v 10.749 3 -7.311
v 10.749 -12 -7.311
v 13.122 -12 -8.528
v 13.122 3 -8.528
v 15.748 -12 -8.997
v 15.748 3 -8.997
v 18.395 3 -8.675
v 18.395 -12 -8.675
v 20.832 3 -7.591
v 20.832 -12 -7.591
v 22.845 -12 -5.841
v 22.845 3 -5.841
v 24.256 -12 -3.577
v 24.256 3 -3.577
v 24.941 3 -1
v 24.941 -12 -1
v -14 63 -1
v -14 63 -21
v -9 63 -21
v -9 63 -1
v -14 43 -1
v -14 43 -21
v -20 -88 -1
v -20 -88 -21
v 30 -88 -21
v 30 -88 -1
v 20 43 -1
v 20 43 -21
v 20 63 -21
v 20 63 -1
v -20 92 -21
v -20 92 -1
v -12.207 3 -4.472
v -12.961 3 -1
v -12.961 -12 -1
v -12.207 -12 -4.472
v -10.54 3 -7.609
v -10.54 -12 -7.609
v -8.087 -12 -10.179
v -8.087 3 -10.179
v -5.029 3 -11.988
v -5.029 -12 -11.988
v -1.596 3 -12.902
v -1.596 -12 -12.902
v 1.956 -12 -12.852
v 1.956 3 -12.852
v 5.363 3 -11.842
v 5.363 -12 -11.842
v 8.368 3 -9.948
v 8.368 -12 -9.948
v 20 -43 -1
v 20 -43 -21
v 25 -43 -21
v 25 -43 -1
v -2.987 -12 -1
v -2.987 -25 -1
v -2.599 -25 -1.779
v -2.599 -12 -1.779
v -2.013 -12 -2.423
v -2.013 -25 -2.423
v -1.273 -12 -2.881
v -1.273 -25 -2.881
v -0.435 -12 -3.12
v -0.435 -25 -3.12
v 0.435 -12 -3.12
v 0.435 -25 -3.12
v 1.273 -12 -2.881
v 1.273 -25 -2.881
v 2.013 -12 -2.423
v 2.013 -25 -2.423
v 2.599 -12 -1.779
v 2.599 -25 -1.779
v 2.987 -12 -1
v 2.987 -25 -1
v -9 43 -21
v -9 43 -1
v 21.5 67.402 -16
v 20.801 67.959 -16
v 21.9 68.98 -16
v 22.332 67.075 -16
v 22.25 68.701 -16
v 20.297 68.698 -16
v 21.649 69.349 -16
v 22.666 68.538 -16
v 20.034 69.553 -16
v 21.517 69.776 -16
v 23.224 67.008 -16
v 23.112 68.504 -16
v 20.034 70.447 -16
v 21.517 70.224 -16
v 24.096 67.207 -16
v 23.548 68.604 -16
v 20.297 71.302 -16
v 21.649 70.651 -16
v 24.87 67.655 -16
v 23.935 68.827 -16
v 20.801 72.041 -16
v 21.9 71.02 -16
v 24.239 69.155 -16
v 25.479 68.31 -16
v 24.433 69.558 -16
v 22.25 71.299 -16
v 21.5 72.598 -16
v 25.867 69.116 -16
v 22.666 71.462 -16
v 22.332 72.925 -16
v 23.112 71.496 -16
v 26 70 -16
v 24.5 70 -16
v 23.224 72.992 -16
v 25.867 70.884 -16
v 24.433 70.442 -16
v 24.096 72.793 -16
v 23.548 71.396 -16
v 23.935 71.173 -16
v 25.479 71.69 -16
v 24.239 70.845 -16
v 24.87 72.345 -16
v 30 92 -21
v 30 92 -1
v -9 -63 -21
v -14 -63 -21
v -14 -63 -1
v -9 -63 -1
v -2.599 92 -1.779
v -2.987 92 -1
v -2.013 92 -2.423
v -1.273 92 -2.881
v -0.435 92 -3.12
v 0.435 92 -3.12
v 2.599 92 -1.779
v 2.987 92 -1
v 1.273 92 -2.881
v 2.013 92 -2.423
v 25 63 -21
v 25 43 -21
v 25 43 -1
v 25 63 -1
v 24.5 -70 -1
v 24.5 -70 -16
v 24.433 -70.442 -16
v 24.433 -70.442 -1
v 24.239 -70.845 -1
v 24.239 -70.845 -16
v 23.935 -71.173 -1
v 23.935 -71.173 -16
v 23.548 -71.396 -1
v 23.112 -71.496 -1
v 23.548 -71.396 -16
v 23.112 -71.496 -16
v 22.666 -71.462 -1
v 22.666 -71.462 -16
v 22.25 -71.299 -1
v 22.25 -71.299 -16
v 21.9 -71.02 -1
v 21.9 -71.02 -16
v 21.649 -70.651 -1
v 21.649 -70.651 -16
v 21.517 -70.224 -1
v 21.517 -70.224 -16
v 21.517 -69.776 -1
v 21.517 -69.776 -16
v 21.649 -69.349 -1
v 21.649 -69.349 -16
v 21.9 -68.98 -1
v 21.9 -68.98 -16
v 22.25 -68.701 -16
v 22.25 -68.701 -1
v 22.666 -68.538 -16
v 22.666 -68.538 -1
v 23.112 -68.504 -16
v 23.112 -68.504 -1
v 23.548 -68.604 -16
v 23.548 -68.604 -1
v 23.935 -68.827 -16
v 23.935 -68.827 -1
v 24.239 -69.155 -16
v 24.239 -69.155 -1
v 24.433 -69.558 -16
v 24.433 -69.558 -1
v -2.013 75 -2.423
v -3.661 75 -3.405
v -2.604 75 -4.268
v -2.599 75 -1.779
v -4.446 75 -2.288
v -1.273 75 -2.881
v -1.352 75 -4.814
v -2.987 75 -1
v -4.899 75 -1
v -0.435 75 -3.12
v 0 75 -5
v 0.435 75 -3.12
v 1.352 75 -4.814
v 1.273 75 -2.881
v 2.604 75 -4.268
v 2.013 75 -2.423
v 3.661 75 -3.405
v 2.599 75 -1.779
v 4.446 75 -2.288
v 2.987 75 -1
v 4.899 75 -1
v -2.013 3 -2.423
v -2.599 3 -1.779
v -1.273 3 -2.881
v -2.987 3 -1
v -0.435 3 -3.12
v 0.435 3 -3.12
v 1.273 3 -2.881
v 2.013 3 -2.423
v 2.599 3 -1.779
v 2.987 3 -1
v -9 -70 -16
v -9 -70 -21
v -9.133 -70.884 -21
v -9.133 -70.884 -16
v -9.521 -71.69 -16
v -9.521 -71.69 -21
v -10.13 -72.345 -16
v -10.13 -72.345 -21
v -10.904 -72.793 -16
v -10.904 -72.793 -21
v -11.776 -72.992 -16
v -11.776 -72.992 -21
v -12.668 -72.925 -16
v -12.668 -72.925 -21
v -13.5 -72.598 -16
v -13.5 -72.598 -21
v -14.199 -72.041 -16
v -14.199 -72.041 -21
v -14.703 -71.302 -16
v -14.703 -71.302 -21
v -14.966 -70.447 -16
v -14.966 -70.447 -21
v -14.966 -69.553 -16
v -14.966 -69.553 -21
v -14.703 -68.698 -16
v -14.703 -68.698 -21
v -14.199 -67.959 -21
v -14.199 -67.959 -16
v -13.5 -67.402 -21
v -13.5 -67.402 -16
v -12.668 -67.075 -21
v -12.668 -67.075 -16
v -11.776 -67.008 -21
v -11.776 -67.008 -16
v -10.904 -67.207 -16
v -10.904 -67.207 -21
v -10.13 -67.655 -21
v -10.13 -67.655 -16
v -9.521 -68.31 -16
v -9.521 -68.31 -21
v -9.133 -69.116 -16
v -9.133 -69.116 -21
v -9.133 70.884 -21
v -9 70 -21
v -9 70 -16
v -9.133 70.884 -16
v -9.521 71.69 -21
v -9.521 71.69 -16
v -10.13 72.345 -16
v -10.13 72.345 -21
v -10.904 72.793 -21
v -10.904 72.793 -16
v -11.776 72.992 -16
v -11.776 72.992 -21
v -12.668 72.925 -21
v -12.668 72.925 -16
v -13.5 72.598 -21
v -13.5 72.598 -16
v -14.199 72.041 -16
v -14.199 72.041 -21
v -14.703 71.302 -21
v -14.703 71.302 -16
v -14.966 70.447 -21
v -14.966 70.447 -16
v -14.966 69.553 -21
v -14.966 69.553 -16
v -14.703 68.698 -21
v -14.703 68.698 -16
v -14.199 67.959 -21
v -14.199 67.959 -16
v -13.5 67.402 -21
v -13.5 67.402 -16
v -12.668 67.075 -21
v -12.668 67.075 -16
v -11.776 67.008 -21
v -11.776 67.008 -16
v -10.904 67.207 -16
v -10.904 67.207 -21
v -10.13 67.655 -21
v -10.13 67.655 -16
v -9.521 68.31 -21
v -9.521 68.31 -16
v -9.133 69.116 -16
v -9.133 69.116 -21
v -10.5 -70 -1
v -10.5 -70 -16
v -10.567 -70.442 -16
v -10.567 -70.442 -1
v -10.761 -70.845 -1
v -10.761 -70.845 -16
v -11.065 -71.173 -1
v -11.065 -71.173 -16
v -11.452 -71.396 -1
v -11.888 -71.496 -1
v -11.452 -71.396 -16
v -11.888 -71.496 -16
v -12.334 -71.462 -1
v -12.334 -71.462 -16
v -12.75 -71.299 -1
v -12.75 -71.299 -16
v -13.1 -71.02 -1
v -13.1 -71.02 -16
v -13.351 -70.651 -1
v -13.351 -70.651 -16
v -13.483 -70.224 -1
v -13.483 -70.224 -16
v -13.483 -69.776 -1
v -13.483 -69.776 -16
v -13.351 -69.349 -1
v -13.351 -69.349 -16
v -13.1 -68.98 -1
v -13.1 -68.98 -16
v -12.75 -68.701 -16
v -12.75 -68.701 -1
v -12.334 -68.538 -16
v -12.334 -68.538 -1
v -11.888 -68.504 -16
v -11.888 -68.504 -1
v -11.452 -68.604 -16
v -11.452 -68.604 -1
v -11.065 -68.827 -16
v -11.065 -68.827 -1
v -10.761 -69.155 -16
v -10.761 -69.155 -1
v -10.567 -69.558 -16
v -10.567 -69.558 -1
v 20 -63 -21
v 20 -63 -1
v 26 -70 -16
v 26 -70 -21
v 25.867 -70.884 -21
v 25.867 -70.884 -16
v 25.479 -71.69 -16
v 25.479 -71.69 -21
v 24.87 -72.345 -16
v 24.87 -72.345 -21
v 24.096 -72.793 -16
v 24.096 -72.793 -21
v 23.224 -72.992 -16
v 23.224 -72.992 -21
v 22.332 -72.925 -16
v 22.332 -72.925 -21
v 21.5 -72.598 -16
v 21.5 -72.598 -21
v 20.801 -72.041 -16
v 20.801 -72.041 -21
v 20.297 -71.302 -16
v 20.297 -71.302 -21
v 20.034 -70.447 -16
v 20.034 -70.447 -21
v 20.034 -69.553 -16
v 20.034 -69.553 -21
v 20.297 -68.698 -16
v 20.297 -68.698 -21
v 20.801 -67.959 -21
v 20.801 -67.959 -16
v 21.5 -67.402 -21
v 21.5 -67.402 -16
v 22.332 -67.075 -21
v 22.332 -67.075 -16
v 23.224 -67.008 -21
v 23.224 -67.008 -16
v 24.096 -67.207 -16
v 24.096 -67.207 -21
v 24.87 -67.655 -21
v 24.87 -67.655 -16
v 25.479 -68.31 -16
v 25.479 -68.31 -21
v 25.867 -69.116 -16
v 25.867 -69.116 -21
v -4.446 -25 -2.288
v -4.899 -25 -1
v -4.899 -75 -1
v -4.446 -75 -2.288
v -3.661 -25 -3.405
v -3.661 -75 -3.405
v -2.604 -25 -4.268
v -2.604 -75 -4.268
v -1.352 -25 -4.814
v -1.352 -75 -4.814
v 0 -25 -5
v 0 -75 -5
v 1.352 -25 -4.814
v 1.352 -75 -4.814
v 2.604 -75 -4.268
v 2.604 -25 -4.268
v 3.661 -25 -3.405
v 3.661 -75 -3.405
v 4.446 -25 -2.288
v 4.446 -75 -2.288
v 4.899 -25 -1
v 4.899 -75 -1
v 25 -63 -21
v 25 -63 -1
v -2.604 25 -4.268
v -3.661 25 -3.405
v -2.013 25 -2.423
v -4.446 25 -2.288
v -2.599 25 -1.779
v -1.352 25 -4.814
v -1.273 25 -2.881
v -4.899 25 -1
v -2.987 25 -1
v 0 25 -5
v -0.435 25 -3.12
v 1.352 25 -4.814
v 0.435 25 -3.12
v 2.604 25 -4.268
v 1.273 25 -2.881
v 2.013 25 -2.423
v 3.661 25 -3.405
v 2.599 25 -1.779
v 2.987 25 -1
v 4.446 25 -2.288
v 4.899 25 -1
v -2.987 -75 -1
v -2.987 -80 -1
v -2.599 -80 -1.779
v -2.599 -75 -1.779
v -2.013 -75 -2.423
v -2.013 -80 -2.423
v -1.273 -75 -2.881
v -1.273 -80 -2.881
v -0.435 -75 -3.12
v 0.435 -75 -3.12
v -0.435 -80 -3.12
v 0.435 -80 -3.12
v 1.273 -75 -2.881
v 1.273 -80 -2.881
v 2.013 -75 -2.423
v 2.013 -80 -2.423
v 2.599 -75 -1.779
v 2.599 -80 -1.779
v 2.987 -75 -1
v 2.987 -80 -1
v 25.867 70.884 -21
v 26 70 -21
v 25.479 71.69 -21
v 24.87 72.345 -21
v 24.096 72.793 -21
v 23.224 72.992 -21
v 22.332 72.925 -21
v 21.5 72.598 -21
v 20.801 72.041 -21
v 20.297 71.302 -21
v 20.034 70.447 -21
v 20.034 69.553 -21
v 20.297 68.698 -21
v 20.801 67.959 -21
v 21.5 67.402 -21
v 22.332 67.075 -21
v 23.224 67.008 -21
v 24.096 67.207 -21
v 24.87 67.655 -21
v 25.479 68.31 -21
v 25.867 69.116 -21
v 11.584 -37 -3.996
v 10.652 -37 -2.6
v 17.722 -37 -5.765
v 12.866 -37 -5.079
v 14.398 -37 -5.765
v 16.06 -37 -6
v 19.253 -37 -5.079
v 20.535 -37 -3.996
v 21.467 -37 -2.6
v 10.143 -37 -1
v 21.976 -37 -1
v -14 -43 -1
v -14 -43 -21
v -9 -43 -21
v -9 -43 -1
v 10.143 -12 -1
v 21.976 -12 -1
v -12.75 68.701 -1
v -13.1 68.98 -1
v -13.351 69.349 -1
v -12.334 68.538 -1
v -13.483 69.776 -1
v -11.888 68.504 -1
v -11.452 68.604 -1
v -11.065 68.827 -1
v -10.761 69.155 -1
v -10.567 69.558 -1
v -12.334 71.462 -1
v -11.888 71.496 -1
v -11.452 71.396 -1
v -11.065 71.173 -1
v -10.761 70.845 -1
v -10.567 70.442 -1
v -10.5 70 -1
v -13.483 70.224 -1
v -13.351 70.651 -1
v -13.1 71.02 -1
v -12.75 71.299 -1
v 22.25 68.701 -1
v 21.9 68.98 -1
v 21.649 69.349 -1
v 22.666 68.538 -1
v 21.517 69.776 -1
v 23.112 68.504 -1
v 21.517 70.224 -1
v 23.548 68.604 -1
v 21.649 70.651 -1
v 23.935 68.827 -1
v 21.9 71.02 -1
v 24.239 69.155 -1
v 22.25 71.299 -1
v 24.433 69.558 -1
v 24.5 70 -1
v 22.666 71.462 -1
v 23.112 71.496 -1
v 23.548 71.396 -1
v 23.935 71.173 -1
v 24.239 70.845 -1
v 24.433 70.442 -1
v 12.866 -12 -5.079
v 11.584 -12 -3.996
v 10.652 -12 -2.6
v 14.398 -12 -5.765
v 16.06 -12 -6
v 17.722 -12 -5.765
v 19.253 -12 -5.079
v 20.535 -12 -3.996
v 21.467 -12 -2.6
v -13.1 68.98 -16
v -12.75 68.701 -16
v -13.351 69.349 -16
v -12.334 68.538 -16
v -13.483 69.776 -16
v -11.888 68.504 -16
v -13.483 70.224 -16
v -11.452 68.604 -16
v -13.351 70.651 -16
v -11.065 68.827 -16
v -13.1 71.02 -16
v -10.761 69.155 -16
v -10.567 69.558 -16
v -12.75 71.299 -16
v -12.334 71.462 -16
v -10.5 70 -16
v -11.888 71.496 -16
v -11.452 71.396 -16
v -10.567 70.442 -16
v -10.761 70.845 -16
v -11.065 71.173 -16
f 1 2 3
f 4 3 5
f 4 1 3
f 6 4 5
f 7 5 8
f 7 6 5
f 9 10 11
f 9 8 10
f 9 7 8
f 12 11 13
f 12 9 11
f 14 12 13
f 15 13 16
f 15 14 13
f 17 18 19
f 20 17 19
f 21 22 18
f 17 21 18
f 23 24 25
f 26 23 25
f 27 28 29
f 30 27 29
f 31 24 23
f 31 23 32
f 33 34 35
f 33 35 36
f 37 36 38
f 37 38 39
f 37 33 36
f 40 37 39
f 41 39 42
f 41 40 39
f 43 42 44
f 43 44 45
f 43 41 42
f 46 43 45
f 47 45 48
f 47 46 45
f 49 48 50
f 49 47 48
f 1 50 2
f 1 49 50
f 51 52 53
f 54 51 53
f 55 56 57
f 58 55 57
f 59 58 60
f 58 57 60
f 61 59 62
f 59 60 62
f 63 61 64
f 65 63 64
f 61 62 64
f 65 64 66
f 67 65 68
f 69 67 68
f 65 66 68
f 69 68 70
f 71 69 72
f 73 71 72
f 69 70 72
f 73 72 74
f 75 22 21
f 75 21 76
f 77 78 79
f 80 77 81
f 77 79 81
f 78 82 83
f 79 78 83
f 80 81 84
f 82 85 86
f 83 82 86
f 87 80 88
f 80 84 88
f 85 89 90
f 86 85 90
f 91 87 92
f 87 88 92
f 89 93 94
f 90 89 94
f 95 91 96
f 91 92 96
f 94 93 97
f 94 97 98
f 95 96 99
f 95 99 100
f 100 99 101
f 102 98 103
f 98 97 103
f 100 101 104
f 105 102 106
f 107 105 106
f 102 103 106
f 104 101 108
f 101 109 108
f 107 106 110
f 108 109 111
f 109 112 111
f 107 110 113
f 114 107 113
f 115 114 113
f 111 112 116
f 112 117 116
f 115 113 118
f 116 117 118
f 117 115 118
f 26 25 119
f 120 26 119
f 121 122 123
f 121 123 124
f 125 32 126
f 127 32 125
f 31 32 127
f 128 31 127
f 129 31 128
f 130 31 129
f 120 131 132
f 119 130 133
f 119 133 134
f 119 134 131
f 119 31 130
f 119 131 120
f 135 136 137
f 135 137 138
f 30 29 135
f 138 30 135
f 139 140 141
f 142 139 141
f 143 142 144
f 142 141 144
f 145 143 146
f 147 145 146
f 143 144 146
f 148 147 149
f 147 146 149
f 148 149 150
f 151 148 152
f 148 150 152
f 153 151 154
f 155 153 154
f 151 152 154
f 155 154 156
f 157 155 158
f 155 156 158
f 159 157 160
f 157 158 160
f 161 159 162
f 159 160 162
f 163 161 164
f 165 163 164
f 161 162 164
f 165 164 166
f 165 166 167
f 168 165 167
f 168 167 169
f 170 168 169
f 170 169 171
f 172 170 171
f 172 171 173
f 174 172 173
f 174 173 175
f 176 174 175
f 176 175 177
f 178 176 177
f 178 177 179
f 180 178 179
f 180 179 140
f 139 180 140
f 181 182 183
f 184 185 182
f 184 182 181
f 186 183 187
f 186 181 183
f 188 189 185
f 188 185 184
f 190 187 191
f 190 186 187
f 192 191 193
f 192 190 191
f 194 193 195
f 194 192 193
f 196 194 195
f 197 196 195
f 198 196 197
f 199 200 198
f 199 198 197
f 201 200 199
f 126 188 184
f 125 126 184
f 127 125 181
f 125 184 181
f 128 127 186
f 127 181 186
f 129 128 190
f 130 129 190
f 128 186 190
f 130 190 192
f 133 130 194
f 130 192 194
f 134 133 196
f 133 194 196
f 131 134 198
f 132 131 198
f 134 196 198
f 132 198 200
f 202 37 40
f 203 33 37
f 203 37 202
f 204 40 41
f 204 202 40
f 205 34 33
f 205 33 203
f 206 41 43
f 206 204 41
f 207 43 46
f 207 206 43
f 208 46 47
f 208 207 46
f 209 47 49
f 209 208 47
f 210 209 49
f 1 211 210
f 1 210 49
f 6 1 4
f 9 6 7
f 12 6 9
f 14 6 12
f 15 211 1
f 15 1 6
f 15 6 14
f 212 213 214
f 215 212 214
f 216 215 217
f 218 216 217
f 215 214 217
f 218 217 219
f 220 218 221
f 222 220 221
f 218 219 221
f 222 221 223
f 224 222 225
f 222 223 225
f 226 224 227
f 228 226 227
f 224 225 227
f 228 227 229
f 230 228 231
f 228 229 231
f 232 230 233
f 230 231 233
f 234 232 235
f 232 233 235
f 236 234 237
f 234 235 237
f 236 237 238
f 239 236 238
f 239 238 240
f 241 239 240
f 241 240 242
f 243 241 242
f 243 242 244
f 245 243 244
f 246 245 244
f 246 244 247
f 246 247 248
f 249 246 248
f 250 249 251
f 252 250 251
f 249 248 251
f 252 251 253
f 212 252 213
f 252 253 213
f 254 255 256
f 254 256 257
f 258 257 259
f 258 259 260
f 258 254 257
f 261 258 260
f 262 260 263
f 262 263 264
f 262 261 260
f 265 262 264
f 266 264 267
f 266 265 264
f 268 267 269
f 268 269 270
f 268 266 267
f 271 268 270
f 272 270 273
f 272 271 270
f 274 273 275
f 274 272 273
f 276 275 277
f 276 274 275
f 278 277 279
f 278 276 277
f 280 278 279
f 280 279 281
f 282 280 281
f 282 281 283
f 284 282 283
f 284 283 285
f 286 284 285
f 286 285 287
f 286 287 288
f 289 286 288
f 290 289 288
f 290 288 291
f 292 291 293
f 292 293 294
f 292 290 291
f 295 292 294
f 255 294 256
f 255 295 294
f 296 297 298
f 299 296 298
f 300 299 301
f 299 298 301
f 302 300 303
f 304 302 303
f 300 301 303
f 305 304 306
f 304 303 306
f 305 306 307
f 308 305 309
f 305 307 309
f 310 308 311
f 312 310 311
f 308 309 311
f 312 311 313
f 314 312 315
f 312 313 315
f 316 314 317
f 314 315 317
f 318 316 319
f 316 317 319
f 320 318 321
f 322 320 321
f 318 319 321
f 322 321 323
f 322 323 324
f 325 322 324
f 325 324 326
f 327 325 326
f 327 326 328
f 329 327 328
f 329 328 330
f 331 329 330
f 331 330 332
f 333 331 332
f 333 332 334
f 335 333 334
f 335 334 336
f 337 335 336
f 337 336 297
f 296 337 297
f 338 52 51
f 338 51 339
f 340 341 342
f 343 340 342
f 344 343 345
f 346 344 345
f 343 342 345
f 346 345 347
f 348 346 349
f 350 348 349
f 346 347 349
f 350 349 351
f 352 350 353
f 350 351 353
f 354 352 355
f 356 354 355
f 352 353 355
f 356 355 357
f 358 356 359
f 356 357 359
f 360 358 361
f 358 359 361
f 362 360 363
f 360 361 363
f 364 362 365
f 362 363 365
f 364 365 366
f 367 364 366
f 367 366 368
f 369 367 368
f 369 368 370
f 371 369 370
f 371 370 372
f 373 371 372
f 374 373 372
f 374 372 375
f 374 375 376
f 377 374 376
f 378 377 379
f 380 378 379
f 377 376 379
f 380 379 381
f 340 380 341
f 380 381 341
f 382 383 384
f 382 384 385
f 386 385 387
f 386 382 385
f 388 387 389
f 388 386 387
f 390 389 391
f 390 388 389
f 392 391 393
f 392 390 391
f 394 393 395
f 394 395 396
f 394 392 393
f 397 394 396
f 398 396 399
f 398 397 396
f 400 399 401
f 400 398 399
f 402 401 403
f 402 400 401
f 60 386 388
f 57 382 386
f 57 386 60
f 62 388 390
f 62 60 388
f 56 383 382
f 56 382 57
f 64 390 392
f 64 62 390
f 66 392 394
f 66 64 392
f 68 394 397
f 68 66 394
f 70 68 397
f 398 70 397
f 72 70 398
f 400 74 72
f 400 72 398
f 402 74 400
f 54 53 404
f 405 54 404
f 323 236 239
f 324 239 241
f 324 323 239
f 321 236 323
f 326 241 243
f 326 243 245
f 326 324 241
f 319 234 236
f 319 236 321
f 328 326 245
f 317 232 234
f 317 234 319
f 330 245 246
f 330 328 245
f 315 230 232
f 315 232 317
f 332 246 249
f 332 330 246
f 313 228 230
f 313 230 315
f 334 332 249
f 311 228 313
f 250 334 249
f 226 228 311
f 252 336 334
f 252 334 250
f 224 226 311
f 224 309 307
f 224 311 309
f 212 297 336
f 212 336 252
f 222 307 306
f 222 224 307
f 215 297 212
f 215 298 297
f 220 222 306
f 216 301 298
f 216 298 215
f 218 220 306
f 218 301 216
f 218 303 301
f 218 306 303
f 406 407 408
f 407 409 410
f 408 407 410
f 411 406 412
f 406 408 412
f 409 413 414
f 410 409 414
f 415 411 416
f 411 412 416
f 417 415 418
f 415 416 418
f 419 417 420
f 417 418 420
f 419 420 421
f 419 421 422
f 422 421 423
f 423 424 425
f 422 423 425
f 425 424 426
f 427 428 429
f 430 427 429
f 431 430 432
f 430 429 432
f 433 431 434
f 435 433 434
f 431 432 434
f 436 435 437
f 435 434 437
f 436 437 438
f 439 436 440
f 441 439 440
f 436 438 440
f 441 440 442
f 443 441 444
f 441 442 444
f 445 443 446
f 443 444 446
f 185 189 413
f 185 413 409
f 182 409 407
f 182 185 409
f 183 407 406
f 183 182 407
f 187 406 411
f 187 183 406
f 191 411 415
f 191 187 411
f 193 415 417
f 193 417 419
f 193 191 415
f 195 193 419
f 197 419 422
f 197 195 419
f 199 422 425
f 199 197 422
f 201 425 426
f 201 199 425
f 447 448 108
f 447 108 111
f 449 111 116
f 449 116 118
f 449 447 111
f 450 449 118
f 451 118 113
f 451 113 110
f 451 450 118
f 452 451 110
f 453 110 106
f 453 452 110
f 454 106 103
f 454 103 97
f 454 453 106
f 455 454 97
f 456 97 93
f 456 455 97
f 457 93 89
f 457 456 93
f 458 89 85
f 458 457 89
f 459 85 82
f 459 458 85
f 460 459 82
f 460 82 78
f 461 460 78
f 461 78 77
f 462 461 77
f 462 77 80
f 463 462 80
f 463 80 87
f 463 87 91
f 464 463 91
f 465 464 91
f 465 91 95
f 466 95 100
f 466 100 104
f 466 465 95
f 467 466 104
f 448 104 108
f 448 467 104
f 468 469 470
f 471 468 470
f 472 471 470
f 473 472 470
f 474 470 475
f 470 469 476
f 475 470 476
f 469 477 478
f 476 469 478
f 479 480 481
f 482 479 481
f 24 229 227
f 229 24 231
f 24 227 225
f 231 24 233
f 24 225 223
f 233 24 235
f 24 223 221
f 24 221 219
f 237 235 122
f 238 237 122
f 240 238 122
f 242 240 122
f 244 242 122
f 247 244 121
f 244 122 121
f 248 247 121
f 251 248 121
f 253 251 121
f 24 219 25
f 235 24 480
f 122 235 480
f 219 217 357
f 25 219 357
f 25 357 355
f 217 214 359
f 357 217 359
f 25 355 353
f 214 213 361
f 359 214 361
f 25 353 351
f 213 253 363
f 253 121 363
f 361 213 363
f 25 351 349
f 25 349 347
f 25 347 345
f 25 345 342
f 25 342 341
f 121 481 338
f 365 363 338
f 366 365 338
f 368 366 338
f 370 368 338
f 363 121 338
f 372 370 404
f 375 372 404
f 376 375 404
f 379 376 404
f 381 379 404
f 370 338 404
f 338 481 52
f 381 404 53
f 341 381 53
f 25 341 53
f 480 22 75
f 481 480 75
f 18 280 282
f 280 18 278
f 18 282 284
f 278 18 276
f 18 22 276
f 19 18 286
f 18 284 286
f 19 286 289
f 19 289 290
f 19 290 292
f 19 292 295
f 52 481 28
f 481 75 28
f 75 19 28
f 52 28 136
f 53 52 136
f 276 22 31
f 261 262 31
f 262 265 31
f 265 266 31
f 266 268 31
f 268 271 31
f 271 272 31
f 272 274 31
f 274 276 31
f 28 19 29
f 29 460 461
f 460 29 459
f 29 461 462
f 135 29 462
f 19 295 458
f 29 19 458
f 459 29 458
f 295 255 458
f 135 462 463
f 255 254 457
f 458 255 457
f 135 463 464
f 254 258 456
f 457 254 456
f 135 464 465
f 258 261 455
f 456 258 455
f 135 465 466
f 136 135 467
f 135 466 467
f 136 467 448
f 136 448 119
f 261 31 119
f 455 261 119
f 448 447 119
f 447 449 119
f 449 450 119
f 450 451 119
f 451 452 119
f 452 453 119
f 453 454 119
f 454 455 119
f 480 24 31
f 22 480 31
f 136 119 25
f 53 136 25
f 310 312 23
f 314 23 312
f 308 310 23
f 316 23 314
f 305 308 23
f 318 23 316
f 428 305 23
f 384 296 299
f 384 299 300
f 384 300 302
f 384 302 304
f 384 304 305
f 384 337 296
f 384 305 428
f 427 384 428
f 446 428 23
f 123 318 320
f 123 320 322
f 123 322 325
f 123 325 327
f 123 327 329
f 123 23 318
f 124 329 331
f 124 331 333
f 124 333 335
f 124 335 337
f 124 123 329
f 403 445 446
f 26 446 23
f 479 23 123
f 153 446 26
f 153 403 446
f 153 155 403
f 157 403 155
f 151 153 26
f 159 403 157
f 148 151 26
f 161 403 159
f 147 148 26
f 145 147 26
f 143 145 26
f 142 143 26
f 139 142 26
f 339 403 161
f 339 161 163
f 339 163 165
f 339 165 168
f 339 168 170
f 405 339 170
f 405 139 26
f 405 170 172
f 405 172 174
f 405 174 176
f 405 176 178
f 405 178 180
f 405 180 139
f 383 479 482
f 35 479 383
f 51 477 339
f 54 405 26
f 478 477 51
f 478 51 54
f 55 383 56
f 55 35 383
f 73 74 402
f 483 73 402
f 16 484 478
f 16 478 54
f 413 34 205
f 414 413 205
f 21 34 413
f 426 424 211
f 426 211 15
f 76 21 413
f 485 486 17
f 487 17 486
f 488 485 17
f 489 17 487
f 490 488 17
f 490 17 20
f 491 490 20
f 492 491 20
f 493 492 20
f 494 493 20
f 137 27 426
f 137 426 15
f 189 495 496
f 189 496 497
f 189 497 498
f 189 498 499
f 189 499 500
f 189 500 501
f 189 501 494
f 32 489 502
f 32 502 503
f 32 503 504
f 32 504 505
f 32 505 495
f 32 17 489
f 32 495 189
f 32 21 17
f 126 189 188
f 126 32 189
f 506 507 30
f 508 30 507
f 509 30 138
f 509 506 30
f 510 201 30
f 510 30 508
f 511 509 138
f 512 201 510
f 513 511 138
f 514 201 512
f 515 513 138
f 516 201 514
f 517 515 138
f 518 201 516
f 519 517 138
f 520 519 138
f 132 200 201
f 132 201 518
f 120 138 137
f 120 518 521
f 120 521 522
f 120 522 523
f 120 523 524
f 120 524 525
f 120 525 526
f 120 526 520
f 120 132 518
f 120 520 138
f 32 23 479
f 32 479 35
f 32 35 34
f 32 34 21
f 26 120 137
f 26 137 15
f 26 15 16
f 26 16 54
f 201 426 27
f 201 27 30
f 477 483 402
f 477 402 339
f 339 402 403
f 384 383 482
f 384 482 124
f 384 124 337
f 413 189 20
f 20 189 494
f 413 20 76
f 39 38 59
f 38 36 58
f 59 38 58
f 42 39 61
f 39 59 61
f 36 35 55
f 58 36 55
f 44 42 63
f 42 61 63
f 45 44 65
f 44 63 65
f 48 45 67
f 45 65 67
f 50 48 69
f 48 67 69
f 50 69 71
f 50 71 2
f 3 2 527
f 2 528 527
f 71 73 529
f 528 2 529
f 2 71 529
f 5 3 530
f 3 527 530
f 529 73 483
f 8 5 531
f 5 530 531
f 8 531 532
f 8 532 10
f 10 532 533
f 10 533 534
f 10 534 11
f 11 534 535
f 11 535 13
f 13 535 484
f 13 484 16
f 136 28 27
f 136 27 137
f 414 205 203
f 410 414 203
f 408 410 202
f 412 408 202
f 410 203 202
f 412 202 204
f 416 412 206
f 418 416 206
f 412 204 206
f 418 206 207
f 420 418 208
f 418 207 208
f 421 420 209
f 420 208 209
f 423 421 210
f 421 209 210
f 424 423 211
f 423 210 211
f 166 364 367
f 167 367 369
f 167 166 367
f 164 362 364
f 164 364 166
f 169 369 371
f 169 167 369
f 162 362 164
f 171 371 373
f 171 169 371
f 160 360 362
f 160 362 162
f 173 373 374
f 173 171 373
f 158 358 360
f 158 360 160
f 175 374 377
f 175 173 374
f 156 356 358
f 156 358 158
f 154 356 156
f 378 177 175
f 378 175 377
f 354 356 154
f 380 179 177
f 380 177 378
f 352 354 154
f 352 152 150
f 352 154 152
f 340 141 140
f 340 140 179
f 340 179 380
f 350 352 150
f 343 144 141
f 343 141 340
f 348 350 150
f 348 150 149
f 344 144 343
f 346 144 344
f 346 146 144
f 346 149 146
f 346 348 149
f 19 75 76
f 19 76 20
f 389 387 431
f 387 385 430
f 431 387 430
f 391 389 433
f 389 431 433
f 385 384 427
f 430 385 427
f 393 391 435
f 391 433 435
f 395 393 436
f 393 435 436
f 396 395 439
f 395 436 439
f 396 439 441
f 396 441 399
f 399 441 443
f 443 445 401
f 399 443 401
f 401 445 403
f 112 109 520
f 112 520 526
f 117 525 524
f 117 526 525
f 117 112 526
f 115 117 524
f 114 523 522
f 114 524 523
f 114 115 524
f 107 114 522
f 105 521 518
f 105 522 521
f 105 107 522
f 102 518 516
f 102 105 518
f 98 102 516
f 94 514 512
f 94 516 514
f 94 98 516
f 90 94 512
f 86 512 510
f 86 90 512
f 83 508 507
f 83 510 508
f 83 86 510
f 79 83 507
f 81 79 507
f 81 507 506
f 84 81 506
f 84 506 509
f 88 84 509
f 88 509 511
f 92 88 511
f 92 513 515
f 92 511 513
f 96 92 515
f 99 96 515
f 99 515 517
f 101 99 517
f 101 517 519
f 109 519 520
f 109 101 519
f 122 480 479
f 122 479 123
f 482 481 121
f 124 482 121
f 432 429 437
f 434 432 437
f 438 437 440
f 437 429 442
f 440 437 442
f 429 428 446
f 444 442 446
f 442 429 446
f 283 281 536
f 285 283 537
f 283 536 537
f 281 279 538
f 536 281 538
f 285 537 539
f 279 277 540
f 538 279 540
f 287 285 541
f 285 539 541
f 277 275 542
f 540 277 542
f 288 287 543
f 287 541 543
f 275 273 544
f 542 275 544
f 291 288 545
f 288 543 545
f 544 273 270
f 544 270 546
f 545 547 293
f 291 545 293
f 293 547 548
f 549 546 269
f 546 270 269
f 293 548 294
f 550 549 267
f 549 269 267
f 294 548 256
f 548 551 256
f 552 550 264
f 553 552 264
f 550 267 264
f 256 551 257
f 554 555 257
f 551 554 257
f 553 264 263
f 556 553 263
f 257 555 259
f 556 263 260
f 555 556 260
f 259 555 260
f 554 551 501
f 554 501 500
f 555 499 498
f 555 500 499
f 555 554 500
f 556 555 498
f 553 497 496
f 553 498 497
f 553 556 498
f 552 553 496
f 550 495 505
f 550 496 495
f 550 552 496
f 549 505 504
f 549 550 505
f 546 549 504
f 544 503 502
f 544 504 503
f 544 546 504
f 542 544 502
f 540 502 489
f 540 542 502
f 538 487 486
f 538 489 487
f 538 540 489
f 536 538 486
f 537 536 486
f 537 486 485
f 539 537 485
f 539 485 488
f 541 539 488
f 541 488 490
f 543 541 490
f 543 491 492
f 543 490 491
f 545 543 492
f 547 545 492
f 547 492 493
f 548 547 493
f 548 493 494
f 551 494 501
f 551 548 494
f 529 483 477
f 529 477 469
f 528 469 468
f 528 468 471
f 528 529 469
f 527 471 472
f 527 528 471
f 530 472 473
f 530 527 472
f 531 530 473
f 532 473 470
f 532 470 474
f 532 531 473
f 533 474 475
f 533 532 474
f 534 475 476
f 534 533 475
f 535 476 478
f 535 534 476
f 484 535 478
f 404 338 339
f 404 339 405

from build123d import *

# Parameters (mm, degrees)
SKETCH006_R     = 3.15
PAD002_DEPTH    = 190
SKETCH011_R     = 5
PAD007_DEPTH    = 50
SKETCH010_R     = 5
PAD006_DEPTH    = 50
SKETCH008_R     = 13
PAD004_DEPTH    = 15
SKETCH009_R     = 9
PAD005_DEPTH    = 15
SKETCH013_R     = 6
PAD008_DEPTH    = 26
BOX001_W        = 50
BOX001_H        = 180
BOX001_DEPTH    = 20
SKETCH015_R     = 1.5
POCKET001_DEPTH = 395.766885
SKETCH016_R     = 1.5
POCKET002_DEPTH = 395.766885
SKETCH017_R     = 3
POCKET003_DEPTH = 5
SKETCH018_R     = 3
POCKET004_DEPTH = 5
SKETCH022_W     = 5
SKETCH022_H     = 20
POCKET008_DEPTH = 395.766885
SKETCH023_W     = 5
SKETCH023_H     = 20
POCKET009_DEPTH = 395.766885


with BuildPart() as pad002:
    # Sketch006 → Pad002 (new body)
    with BuildSketch(Plane.XZ.offset(80)):
        Circle(SKETCH006_R)
    extrude(amount=-PAD002_DEPTH)


with BuildPart() as pad007:
    # Sketch011 → Pad007 (new body)
    with BuildSketch(Plane.XZ.offset(-75)):
        Circle(SKETCH011_R)
    extrude(amount=PAD007_DEPTH)


with BuildPart() as scassi_perno:
    # Sketch010 → Pad006 (new body)
    with BuildSketch(Plane.XZ.offset(25)):
        Circle(SKETCH010_R)
    extrude(amount=PAD006_DEPTH)

    # Fusion002: union Pad007
    add(pad007.part)


with BuildPart() as scasso_ruota_dentata:
    # Sketch008 → Pad004 (new body)
    with BuildSketch(Plane.XZ.offset(-3)):
        Circle(SKETCH008_R)
    extrude(amount=PAD004_DEPTH)


with BuildPart() as scassi_ruote_dentate:
    # Sketch009 → Pad005 (new body)
    with BuildSketch(Plane.XZ.offset(-3)):
        with Locations((15.997087, 9e-06)):
            Circle(SKETCH009_R)
    extrude(amount=PAD005_DEPTH)

    # Fusion001: union scasso_ruota_dentata
    add(scasso_ruota_dentata.part)


with BuildPart() as fusion:
    # Sketch013 → Pad008 (new body)
    with BuildSketch(Plane.XZ.offset(11)):
        with Locations((16.059561, 9e-06)):
            Circle(SKETCH013_R)
    extrude(amount=PAD008_DEPTH)

    # Fusion005: union scassi_perno, scassi_ruote_dentate
    add(scassi_perno.part)
    add(scassi_ruote_dentate.part)

    # Fusion: union Pad002
    add(pad002.part)


with BuildPart() as mirrored007:
    # Box001 → Box001 (new body)
    with BuildSketch(Plane(origin=(-20, -88, -21), x_dir=(1, 0, 0), z_dir=(0, 0, 1))):
        with Locations((25, 90)):
            Rectangle(BOX001_W, BOX001_H)
    extrude(amount=BOX001_DEPTH)

    # Cut001: cut Fusion
    add(fusion.part, mode=Mode.SUBTRACT)

    # Sketch015 → Pocket001 (cut, through all)
    with BuildSketch(Plane(origin=(0, 0, -21), x_dir=(1, 0, 0), z_dir=(0, 0, -1))):
        with Locations((23, 70)):
            Circle(SKETCH015_R)
    pocket001 = extrude(amount=-POCKET001_DEPTH, mode=Mode.SUBTRACT)

    # Mirrored: Pocket001 across Sketch015 H_Axis
    add(pocket001.mirror(Plane(origin=(0, 0, -21), x_dir=(0, 0, -1), z_dir=(0, -1, 0))), mode=Mode.SUBTRACT)

    # Sketch016 → Pocket002 (cut, through all)
    with BuildSketch(Plane(origin=(0, 0, -21), x_dir=(1, 0, 0), z_dir=(0, 0, -1))):
        with Locations((-12, 70)):
            Circle(SKETCH016_R)
    pocket002 = extrude(amount=-POCKET002_DEPTH, mode=Mode.SUBTRACT)

    # Mirrored001: Pocket002 across Sketch016 H_Axis
    add(pocket002.mirror(Plane(origin=(0, 0, -21), x_dir=(0, 0, -1), z_dir=(0, -1, 0))), mode=Mode.SUBTRACT)

    # Sketch017 → Pocket003 (cut)
    with BuildSketch(Plane(origin=(0, 0, -21), x_dir=(1, 0, 0), z_dir=(0, 0, -1))):
        with Locations((23, 70)):
            Circle(SKETCH017_R)
    pocket003 = extrude(amount=-POCKET003_DEPTH, mode=Mode.SUBTRACT)

    # Mirrored002: Pocket003 across Sketch017 H_Axis
    add(pocket003.mirror(Plane(origin=(0, 0, -21), x_dir=(0, 0, -1), z_dir=(0, -1, 0))), mode=Mode.SUBTRACT)

    # Sketch018 → Pocket004 (cut)
    with BuildSketch(Plane(origin=(0, 0, -21), x_dir=(1, 0, 0), z_dir=(0, 0, -1))):
        with Locations((-12, 70)):
            Circle(SKETCH018_R)
    pocket004 = extrude(amount=-POCKET004_DEPTH, mode=Mode.SUBTRACT)

    # Mirrored003: Pocket004 across Sketch018 H_Axis
    add(pocket004.mirror(Plane(origin=(0, 0, -21), x_dir=(0, 0, -1), z_dir=(0, -1, 0))), mode=Mode.SUBTRACT)

    # Sketch022 → Pocket008 (cut, through all)
    with BuildSketch(Plane(origin=(0, 0, -21), x_dir=(1, 0, 0), z_dir=(0, 0, -1))):
        with Locations((22.5, 53)):
            Rectangle(SKETCH022_W, SKETCH022_H)
    pocket008 = extrude(amount=-POCKET008_DEPTH, mode=Mode.SUBTRACT)

    # Mirrored006: Pocket008 across Sketch022 H_Axis
    add(pocket008.mirror(Plane(origin=(0, 0, -21), x_dir=(0, 0, -1), z_dir=(0, -1, 0))), mode=Mode.SUBTRACT)

    # Sketch023 → Pocket009 (cut, through all)
    with BuildSketch(Plane(origin=(0, 0, -21), x_dir=(1, 0, 0), z_dir=(0, 0, -1))):
        with Locations((-11.5, 53)):
            Rectangle(SKETCH023_W, SKETCH023_H)
    pocket009 = extrude(amount=-POCKET009_DEPTH, mode=Mode.SUBTRACT)

    # Mirrored007: Pocket009 across Sketch023 H_Axis
    add(pocket009.mirror(Plane(origin=(0, 0, -21), x_dir=(0, 0, -1), z_dir=(0, -1, 0))), mode=Mode.SUBTRACT)


solid = mirrored007.part
